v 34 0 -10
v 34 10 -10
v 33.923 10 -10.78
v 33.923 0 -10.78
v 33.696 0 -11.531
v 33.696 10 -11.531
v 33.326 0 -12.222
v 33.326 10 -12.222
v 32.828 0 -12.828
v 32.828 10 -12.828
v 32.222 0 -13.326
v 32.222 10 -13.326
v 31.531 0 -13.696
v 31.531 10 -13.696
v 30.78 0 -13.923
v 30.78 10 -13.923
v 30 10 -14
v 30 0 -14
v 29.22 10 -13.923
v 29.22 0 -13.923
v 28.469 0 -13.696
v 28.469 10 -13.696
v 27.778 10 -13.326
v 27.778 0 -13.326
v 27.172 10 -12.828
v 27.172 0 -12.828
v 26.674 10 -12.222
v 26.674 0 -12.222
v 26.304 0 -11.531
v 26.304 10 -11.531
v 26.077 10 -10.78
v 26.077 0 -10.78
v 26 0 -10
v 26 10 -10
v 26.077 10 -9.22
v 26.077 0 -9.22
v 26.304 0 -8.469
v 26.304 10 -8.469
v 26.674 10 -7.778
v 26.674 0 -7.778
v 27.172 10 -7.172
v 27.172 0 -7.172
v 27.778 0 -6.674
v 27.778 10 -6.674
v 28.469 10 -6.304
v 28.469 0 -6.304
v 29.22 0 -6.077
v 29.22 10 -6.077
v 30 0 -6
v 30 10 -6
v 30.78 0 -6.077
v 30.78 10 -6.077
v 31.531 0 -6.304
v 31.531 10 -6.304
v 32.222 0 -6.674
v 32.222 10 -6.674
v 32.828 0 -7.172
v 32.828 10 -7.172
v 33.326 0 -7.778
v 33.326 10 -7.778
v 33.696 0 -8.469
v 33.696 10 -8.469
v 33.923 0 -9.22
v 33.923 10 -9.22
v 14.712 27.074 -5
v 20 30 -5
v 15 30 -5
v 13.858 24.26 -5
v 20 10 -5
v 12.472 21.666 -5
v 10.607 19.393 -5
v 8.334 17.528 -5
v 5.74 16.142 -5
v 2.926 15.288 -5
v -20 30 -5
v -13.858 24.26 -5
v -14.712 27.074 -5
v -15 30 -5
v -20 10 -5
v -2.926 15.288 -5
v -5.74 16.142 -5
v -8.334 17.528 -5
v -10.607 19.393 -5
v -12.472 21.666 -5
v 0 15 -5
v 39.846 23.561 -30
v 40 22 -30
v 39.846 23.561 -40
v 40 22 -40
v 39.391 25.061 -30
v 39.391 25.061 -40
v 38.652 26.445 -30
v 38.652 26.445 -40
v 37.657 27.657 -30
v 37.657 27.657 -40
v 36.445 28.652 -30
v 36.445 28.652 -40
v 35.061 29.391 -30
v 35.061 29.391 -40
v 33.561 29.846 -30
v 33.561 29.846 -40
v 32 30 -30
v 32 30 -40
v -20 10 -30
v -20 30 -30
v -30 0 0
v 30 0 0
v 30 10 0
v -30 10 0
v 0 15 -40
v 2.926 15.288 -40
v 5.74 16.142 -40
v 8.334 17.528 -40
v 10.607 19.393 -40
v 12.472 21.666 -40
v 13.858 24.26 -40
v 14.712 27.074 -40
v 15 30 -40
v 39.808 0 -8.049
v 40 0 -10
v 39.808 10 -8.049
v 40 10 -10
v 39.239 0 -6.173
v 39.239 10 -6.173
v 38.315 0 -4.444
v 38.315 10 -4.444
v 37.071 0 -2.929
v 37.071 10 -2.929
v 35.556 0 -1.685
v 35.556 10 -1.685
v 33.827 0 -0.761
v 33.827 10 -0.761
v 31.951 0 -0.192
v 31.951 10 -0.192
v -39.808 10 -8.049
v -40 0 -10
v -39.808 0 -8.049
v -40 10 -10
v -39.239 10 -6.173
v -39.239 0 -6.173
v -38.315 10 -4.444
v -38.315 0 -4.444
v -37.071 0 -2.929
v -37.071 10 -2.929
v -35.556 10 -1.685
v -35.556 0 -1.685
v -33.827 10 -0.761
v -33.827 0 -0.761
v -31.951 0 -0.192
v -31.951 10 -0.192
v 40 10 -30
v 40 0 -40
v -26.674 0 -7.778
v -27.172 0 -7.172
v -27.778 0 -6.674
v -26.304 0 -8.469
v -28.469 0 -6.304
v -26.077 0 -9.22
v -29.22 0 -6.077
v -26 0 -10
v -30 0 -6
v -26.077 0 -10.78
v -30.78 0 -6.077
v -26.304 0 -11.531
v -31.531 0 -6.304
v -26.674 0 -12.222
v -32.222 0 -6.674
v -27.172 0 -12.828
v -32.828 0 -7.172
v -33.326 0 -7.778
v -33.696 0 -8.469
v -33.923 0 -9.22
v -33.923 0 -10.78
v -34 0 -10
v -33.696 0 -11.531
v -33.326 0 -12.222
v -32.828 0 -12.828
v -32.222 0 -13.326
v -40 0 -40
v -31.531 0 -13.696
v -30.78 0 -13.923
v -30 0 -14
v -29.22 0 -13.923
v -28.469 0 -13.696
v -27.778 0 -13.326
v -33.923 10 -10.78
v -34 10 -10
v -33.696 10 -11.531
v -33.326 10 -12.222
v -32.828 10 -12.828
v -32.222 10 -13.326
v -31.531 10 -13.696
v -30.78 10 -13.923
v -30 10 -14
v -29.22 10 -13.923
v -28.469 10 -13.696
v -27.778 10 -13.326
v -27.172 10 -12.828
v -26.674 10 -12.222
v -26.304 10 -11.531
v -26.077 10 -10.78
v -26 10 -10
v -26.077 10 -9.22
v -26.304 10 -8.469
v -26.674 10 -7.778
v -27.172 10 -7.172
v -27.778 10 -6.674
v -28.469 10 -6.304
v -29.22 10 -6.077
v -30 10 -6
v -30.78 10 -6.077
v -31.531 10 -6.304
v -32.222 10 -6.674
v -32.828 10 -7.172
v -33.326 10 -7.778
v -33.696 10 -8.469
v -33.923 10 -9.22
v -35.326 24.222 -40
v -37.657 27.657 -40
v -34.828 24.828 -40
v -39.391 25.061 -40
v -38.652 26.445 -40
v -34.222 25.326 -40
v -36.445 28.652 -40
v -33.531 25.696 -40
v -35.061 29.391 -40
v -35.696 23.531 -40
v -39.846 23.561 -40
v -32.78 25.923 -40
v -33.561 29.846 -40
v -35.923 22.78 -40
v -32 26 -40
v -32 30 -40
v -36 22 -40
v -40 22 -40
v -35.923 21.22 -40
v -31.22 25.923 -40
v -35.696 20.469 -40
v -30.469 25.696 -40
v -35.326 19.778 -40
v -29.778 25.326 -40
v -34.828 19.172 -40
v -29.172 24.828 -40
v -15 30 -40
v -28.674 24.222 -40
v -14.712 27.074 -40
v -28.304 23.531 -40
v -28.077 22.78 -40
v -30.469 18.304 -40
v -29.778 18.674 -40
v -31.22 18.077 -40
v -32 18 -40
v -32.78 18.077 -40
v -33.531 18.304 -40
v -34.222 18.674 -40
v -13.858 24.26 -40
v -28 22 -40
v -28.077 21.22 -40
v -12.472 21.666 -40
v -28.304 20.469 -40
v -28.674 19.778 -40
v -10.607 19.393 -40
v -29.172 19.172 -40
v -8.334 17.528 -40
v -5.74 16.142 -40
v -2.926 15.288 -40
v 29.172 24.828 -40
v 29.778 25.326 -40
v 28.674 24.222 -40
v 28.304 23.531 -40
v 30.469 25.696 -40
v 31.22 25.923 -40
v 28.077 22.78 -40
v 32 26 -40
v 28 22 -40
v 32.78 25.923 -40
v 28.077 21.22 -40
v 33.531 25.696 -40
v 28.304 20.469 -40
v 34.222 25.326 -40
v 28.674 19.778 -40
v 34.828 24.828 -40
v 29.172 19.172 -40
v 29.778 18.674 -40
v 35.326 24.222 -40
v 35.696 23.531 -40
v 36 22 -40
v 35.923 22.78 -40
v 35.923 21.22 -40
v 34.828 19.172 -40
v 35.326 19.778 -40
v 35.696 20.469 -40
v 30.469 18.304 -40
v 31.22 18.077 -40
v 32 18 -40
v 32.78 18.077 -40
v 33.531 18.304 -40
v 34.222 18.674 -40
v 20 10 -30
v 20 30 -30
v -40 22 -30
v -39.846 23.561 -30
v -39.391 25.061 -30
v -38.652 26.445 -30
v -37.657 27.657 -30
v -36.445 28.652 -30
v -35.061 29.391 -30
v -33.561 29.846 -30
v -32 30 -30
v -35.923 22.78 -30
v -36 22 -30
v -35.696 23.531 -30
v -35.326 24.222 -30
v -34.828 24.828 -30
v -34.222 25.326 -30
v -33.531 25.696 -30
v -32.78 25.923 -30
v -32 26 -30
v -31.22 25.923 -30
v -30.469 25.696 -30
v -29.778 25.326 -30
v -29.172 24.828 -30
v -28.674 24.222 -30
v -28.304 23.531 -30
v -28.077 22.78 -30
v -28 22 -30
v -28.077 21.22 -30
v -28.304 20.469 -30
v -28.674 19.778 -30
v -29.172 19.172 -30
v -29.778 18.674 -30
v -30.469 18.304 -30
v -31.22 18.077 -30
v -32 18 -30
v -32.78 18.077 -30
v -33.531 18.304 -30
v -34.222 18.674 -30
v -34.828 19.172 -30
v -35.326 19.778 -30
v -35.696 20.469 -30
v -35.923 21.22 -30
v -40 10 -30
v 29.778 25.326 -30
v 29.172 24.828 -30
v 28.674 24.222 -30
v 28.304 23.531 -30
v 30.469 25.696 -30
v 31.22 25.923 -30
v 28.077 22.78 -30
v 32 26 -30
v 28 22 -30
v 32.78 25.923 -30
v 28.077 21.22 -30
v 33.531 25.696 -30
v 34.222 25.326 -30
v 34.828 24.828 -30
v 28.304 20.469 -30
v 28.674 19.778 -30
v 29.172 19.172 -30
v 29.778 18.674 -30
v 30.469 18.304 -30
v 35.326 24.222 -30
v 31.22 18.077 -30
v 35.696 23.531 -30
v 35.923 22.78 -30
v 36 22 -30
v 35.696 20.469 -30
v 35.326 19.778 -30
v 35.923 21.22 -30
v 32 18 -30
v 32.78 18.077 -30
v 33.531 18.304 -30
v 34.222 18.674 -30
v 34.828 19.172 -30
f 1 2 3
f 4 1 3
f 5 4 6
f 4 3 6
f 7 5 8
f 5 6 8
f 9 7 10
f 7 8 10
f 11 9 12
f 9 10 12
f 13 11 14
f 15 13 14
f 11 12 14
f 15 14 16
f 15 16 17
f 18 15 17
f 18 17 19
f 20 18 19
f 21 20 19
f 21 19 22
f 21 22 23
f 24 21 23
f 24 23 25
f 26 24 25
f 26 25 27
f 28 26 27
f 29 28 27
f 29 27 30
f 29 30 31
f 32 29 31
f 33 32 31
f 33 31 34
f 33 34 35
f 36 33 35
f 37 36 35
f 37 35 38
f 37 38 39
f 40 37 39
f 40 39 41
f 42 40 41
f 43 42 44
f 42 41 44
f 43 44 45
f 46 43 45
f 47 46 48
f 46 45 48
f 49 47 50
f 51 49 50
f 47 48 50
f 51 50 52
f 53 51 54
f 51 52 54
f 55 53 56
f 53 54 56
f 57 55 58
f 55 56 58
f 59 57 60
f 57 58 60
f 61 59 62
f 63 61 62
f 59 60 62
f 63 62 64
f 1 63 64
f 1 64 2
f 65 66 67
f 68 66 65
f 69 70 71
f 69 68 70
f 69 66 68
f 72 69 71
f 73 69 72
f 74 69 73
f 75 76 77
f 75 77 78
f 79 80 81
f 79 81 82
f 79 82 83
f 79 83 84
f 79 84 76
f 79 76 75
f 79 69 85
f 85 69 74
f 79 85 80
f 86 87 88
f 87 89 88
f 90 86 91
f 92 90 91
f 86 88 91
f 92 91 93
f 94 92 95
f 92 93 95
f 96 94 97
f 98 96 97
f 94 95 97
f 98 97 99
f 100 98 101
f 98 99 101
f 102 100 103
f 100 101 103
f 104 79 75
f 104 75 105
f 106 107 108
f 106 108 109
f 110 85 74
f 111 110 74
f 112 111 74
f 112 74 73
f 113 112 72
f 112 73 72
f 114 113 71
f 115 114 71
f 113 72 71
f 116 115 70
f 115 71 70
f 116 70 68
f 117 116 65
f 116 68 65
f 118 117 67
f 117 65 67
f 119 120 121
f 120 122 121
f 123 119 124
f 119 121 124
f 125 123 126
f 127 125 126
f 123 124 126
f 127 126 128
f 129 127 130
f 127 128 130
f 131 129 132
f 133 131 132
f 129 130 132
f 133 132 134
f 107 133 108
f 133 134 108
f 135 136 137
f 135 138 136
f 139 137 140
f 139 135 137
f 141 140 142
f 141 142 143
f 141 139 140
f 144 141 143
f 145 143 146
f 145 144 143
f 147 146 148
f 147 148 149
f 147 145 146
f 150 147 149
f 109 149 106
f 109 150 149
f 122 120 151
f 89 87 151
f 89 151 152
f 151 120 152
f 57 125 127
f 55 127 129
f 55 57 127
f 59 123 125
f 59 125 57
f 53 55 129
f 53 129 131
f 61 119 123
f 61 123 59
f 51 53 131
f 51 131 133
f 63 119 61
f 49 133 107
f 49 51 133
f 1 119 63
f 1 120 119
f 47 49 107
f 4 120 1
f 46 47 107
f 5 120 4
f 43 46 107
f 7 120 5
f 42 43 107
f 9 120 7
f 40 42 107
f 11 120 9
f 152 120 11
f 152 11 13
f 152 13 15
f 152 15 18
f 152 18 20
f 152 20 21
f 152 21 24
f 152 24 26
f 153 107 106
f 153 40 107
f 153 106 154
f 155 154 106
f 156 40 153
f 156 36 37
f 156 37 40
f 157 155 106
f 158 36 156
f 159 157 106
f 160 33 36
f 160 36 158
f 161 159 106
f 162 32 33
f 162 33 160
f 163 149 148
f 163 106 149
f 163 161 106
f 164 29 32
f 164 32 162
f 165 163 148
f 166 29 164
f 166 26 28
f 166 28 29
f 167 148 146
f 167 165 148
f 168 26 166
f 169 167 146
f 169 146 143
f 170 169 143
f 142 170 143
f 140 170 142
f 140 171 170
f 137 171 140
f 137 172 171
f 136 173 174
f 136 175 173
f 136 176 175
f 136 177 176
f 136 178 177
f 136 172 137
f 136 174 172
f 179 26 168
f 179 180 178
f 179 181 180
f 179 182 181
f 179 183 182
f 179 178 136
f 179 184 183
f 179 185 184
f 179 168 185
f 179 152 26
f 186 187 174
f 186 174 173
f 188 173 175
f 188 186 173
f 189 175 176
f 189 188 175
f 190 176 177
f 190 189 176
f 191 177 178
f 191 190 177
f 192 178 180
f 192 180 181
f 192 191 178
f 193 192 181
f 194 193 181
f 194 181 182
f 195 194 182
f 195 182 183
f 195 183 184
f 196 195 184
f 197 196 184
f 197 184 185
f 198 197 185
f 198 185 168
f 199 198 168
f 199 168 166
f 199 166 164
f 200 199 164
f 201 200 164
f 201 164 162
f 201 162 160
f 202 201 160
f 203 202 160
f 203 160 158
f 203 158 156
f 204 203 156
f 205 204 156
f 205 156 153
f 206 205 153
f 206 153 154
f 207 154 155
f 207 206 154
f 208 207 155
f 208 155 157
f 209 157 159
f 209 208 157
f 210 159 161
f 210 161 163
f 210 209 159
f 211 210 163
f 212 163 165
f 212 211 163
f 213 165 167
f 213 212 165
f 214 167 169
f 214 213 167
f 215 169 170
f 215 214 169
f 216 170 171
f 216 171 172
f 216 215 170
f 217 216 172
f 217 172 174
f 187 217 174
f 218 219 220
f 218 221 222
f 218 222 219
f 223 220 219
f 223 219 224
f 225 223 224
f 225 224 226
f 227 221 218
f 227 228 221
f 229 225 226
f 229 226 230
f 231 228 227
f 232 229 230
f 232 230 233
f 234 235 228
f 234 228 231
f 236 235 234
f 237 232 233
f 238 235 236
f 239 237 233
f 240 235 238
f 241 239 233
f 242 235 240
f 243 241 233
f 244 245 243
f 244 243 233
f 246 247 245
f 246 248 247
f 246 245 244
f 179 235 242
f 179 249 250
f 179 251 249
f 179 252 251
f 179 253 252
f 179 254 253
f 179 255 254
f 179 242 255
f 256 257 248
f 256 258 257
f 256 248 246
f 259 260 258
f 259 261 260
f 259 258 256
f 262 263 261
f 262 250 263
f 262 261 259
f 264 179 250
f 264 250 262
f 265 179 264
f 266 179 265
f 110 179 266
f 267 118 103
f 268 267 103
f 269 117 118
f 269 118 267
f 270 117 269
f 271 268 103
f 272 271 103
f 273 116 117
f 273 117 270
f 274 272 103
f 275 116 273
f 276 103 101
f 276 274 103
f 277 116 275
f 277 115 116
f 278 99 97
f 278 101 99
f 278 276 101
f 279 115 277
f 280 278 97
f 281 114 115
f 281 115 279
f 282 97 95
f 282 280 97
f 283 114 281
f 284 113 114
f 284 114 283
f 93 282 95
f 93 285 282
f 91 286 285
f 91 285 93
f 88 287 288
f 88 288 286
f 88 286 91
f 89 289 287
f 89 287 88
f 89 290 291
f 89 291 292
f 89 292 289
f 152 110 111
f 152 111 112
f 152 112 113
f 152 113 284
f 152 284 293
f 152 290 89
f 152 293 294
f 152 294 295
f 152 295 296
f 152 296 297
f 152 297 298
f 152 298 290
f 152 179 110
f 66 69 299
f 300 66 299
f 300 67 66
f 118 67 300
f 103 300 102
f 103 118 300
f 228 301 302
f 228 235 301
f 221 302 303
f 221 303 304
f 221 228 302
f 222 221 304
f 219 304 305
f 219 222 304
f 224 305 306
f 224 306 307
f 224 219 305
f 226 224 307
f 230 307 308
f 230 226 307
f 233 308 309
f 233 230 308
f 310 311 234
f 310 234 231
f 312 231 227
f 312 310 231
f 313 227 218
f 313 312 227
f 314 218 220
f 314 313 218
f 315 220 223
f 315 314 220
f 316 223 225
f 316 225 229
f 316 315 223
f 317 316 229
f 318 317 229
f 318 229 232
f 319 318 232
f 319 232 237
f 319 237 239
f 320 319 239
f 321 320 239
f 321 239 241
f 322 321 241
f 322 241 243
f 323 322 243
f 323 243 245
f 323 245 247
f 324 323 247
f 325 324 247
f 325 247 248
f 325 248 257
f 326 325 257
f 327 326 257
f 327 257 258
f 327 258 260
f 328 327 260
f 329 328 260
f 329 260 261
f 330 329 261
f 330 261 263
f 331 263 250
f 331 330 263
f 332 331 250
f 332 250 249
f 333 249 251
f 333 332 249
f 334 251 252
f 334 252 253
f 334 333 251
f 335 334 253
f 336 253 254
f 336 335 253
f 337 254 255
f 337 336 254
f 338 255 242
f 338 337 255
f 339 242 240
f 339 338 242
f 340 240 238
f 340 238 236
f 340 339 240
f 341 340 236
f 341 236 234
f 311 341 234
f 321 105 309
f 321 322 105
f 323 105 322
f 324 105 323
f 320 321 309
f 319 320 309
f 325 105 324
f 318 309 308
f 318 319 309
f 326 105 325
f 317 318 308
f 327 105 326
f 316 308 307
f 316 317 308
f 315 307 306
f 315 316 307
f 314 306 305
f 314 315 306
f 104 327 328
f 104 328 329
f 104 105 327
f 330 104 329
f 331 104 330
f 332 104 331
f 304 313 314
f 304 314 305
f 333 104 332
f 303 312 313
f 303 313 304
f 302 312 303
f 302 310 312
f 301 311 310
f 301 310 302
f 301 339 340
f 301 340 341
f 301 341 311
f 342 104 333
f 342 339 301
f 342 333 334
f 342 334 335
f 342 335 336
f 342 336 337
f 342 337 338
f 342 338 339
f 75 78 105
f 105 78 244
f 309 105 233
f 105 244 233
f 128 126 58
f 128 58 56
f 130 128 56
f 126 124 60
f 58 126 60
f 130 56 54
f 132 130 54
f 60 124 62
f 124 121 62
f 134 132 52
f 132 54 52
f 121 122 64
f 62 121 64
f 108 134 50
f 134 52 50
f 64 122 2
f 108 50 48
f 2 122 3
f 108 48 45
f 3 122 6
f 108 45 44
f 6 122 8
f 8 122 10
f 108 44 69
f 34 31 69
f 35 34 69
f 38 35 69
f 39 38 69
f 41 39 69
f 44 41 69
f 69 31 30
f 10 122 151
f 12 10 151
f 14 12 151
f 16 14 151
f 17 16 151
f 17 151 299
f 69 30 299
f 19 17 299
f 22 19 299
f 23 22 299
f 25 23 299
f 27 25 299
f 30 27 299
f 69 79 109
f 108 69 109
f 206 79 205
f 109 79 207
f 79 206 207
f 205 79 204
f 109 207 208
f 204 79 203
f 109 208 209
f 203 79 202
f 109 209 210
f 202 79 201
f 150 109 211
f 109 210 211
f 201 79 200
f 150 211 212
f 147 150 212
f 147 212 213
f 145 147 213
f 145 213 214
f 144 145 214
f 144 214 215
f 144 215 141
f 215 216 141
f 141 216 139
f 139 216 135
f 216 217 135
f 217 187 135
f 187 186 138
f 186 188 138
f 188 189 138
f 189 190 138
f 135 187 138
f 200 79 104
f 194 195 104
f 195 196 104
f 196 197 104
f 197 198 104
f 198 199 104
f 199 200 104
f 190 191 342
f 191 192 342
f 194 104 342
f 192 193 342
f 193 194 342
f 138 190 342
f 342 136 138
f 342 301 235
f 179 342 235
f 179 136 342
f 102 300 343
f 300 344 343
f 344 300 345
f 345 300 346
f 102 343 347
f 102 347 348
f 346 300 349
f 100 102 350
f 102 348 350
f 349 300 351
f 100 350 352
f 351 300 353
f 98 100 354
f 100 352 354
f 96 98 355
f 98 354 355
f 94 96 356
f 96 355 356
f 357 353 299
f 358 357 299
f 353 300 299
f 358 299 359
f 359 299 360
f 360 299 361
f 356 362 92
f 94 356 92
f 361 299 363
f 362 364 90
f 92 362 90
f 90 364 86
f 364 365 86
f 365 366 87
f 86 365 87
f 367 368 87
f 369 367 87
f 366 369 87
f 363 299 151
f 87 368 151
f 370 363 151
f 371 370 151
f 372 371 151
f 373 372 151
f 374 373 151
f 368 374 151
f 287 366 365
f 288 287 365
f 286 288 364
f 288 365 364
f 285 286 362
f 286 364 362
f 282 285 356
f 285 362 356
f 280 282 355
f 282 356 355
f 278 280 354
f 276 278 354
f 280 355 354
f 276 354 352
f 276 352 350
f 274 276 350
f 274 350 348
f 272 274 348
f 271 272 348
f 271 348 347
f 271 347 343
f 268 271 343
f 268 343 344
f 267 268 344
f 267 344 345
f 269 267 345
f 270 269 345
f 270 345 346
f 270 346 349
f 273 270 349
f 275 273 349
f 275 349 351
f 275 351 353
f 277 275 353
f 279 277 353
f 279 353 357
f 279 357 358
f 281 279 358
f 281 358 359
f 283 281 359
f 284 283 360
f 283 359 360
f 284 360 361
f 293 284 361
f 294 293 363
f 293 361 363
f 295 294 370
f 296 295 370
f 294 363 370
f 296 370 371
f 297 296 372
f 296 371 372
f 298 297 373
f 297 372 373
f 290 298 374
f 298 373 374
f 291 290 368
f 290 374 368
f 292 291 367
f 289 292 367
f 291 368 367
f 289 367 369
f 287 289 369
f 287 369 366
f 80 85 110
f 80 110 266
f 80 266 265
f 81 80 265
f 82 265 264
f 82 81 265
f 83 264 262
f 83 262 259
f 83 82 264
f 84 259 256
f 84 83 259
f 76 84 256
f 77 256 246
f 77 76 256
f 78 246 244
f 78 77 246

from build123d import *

# Parameters (mm, degrees)
BOSS_EXTRUDE1_DEPTH = 10
BOSS_EXTRUDE2_DEPTH = 30
CUT_EXTRUDE1_REACH  = 63.033
CUT_EXTRUDE2_REACH  = 62
SKETCH3_R           = 4
FILLET1_R           = 10
FILLET2_R           = 8
CUT_EXTRUDE3_REACH  = 60.31
SKETCH4_R           = 4


with BuildPart() as part:
    # Sketch1 → Boss-Extrude1 (new body)
    with BuildSketch(Plane(origin=(0, 0, 0), x_dir=(1, 0, 0), z_dir=(0, 1, 0))):
        Polygon((40, 0), (40, 30), (20, 30), (20, 5), (0, 5), (0, 0), align=None)
    extrude(amount=BOSS_EXTRUDE1_DEPTH)

    # Sketch1<3> → Boss-Extrude2 (add)
    with BuildSketch(Plane(origin=(0, 0, 0), x_dir=(1, 0, 0), z_dir=(0, 1, 0))):
        Polygon((20, 30), (40, 30), (40, 40), (0, 40), (0, 5), (20, 5), align=None)
    extrude(amount=BOSS_EXTRUDE2_DEPTH)

    # Sketch2 → Cut-Extrude1 (cut, up to next)
    with BuildSketch(Plane.XY.offset(-5), mode=Mode.PRIVATE) as cut_extrude1_sk1:
        with BuildLine():
            Line((15, 30), (0, 30))
            Line((0, 30), (0, 15))
            ThreePointArc((0, 15), (10.606601718, 19.393398282), (15, 30))
        make_face()
    cut_extrude1_tool1 = extrude(cut_extrude1_sk1.sketch, amount=-CUT_EXTRUDE1_REACH, mode=Mode.PRIVATE) & part.part
    add(cut_extrude1_tool1.solids().sort_by_distance((6.366198, 23.633802, -5))[0], mode=Mode.SUBTRACT)

    # Sketch3 → Cut-Extrude2 (cut, up to next)
    with BuildSketch(Plane(origin=(0, 10, 0), x_dir=(1, 0, 0), z_dir=(0, 1, 0)), mode=Mode.PRIVATE) as cut_extrude2_sk1:
        with Locations((30, 10)):
            Circle(SKETCH3_R)
    cut_extrude2_tool1 = extrude(cut_extrude2_sk1.sketch, amount=-CUT_EXTRUDE2_REACH, mode=Mode.PRIVATE) & part.part
    add(cut_extrude2_tool1.solids().sort_by_distance((30, 10, -10))[0], mode=Mode.SUBTRACT)

    # Fillet1
    fillet1_edges = [part.edges().sort_by_distance(p)[0] for p in [
        (40, 5, 0),
    ]]
    fillet(fillet1_edges, radius=FILLET1_R)

    # Fillet2
    fillet2_edges = [part.edges().sort_by_distance(p)[0] for p in [
        (40, 30, -35),
    ]]
    fillet(fillet2_edges, radius=FILLET2_R)

    # Sketch4 → Cut-Extrude3 (cut, up to next)
    with BuildSketch(Plane.XY.offset(-30), mode=Mode.PRIVATE) as cut_extrude3_sk1:
        with Locations((32, 22)):
            Circle(SKETCH4_R)
    cut_extrude3_tool1 = extrude(cut_extrude3_sk1.sketch, amount=-CUT_EXTRUDE3_REACH, mode=Mode.PRIVATE) & part.part
    add(cut_extrude3_tool1.solids().sort_by_distance((32, 22, -30))[0], mode=Mode.SUBTRACT)

    # Mirror1: part across plane


with BuildPart() as part_1:
    add(part.part)
    add(part.part.mirror(Plane(origin=(0, 10, 0), x_dir=(0, 0, 1), z_dir=(-1, 0, 0))))


solid = part_1.part
